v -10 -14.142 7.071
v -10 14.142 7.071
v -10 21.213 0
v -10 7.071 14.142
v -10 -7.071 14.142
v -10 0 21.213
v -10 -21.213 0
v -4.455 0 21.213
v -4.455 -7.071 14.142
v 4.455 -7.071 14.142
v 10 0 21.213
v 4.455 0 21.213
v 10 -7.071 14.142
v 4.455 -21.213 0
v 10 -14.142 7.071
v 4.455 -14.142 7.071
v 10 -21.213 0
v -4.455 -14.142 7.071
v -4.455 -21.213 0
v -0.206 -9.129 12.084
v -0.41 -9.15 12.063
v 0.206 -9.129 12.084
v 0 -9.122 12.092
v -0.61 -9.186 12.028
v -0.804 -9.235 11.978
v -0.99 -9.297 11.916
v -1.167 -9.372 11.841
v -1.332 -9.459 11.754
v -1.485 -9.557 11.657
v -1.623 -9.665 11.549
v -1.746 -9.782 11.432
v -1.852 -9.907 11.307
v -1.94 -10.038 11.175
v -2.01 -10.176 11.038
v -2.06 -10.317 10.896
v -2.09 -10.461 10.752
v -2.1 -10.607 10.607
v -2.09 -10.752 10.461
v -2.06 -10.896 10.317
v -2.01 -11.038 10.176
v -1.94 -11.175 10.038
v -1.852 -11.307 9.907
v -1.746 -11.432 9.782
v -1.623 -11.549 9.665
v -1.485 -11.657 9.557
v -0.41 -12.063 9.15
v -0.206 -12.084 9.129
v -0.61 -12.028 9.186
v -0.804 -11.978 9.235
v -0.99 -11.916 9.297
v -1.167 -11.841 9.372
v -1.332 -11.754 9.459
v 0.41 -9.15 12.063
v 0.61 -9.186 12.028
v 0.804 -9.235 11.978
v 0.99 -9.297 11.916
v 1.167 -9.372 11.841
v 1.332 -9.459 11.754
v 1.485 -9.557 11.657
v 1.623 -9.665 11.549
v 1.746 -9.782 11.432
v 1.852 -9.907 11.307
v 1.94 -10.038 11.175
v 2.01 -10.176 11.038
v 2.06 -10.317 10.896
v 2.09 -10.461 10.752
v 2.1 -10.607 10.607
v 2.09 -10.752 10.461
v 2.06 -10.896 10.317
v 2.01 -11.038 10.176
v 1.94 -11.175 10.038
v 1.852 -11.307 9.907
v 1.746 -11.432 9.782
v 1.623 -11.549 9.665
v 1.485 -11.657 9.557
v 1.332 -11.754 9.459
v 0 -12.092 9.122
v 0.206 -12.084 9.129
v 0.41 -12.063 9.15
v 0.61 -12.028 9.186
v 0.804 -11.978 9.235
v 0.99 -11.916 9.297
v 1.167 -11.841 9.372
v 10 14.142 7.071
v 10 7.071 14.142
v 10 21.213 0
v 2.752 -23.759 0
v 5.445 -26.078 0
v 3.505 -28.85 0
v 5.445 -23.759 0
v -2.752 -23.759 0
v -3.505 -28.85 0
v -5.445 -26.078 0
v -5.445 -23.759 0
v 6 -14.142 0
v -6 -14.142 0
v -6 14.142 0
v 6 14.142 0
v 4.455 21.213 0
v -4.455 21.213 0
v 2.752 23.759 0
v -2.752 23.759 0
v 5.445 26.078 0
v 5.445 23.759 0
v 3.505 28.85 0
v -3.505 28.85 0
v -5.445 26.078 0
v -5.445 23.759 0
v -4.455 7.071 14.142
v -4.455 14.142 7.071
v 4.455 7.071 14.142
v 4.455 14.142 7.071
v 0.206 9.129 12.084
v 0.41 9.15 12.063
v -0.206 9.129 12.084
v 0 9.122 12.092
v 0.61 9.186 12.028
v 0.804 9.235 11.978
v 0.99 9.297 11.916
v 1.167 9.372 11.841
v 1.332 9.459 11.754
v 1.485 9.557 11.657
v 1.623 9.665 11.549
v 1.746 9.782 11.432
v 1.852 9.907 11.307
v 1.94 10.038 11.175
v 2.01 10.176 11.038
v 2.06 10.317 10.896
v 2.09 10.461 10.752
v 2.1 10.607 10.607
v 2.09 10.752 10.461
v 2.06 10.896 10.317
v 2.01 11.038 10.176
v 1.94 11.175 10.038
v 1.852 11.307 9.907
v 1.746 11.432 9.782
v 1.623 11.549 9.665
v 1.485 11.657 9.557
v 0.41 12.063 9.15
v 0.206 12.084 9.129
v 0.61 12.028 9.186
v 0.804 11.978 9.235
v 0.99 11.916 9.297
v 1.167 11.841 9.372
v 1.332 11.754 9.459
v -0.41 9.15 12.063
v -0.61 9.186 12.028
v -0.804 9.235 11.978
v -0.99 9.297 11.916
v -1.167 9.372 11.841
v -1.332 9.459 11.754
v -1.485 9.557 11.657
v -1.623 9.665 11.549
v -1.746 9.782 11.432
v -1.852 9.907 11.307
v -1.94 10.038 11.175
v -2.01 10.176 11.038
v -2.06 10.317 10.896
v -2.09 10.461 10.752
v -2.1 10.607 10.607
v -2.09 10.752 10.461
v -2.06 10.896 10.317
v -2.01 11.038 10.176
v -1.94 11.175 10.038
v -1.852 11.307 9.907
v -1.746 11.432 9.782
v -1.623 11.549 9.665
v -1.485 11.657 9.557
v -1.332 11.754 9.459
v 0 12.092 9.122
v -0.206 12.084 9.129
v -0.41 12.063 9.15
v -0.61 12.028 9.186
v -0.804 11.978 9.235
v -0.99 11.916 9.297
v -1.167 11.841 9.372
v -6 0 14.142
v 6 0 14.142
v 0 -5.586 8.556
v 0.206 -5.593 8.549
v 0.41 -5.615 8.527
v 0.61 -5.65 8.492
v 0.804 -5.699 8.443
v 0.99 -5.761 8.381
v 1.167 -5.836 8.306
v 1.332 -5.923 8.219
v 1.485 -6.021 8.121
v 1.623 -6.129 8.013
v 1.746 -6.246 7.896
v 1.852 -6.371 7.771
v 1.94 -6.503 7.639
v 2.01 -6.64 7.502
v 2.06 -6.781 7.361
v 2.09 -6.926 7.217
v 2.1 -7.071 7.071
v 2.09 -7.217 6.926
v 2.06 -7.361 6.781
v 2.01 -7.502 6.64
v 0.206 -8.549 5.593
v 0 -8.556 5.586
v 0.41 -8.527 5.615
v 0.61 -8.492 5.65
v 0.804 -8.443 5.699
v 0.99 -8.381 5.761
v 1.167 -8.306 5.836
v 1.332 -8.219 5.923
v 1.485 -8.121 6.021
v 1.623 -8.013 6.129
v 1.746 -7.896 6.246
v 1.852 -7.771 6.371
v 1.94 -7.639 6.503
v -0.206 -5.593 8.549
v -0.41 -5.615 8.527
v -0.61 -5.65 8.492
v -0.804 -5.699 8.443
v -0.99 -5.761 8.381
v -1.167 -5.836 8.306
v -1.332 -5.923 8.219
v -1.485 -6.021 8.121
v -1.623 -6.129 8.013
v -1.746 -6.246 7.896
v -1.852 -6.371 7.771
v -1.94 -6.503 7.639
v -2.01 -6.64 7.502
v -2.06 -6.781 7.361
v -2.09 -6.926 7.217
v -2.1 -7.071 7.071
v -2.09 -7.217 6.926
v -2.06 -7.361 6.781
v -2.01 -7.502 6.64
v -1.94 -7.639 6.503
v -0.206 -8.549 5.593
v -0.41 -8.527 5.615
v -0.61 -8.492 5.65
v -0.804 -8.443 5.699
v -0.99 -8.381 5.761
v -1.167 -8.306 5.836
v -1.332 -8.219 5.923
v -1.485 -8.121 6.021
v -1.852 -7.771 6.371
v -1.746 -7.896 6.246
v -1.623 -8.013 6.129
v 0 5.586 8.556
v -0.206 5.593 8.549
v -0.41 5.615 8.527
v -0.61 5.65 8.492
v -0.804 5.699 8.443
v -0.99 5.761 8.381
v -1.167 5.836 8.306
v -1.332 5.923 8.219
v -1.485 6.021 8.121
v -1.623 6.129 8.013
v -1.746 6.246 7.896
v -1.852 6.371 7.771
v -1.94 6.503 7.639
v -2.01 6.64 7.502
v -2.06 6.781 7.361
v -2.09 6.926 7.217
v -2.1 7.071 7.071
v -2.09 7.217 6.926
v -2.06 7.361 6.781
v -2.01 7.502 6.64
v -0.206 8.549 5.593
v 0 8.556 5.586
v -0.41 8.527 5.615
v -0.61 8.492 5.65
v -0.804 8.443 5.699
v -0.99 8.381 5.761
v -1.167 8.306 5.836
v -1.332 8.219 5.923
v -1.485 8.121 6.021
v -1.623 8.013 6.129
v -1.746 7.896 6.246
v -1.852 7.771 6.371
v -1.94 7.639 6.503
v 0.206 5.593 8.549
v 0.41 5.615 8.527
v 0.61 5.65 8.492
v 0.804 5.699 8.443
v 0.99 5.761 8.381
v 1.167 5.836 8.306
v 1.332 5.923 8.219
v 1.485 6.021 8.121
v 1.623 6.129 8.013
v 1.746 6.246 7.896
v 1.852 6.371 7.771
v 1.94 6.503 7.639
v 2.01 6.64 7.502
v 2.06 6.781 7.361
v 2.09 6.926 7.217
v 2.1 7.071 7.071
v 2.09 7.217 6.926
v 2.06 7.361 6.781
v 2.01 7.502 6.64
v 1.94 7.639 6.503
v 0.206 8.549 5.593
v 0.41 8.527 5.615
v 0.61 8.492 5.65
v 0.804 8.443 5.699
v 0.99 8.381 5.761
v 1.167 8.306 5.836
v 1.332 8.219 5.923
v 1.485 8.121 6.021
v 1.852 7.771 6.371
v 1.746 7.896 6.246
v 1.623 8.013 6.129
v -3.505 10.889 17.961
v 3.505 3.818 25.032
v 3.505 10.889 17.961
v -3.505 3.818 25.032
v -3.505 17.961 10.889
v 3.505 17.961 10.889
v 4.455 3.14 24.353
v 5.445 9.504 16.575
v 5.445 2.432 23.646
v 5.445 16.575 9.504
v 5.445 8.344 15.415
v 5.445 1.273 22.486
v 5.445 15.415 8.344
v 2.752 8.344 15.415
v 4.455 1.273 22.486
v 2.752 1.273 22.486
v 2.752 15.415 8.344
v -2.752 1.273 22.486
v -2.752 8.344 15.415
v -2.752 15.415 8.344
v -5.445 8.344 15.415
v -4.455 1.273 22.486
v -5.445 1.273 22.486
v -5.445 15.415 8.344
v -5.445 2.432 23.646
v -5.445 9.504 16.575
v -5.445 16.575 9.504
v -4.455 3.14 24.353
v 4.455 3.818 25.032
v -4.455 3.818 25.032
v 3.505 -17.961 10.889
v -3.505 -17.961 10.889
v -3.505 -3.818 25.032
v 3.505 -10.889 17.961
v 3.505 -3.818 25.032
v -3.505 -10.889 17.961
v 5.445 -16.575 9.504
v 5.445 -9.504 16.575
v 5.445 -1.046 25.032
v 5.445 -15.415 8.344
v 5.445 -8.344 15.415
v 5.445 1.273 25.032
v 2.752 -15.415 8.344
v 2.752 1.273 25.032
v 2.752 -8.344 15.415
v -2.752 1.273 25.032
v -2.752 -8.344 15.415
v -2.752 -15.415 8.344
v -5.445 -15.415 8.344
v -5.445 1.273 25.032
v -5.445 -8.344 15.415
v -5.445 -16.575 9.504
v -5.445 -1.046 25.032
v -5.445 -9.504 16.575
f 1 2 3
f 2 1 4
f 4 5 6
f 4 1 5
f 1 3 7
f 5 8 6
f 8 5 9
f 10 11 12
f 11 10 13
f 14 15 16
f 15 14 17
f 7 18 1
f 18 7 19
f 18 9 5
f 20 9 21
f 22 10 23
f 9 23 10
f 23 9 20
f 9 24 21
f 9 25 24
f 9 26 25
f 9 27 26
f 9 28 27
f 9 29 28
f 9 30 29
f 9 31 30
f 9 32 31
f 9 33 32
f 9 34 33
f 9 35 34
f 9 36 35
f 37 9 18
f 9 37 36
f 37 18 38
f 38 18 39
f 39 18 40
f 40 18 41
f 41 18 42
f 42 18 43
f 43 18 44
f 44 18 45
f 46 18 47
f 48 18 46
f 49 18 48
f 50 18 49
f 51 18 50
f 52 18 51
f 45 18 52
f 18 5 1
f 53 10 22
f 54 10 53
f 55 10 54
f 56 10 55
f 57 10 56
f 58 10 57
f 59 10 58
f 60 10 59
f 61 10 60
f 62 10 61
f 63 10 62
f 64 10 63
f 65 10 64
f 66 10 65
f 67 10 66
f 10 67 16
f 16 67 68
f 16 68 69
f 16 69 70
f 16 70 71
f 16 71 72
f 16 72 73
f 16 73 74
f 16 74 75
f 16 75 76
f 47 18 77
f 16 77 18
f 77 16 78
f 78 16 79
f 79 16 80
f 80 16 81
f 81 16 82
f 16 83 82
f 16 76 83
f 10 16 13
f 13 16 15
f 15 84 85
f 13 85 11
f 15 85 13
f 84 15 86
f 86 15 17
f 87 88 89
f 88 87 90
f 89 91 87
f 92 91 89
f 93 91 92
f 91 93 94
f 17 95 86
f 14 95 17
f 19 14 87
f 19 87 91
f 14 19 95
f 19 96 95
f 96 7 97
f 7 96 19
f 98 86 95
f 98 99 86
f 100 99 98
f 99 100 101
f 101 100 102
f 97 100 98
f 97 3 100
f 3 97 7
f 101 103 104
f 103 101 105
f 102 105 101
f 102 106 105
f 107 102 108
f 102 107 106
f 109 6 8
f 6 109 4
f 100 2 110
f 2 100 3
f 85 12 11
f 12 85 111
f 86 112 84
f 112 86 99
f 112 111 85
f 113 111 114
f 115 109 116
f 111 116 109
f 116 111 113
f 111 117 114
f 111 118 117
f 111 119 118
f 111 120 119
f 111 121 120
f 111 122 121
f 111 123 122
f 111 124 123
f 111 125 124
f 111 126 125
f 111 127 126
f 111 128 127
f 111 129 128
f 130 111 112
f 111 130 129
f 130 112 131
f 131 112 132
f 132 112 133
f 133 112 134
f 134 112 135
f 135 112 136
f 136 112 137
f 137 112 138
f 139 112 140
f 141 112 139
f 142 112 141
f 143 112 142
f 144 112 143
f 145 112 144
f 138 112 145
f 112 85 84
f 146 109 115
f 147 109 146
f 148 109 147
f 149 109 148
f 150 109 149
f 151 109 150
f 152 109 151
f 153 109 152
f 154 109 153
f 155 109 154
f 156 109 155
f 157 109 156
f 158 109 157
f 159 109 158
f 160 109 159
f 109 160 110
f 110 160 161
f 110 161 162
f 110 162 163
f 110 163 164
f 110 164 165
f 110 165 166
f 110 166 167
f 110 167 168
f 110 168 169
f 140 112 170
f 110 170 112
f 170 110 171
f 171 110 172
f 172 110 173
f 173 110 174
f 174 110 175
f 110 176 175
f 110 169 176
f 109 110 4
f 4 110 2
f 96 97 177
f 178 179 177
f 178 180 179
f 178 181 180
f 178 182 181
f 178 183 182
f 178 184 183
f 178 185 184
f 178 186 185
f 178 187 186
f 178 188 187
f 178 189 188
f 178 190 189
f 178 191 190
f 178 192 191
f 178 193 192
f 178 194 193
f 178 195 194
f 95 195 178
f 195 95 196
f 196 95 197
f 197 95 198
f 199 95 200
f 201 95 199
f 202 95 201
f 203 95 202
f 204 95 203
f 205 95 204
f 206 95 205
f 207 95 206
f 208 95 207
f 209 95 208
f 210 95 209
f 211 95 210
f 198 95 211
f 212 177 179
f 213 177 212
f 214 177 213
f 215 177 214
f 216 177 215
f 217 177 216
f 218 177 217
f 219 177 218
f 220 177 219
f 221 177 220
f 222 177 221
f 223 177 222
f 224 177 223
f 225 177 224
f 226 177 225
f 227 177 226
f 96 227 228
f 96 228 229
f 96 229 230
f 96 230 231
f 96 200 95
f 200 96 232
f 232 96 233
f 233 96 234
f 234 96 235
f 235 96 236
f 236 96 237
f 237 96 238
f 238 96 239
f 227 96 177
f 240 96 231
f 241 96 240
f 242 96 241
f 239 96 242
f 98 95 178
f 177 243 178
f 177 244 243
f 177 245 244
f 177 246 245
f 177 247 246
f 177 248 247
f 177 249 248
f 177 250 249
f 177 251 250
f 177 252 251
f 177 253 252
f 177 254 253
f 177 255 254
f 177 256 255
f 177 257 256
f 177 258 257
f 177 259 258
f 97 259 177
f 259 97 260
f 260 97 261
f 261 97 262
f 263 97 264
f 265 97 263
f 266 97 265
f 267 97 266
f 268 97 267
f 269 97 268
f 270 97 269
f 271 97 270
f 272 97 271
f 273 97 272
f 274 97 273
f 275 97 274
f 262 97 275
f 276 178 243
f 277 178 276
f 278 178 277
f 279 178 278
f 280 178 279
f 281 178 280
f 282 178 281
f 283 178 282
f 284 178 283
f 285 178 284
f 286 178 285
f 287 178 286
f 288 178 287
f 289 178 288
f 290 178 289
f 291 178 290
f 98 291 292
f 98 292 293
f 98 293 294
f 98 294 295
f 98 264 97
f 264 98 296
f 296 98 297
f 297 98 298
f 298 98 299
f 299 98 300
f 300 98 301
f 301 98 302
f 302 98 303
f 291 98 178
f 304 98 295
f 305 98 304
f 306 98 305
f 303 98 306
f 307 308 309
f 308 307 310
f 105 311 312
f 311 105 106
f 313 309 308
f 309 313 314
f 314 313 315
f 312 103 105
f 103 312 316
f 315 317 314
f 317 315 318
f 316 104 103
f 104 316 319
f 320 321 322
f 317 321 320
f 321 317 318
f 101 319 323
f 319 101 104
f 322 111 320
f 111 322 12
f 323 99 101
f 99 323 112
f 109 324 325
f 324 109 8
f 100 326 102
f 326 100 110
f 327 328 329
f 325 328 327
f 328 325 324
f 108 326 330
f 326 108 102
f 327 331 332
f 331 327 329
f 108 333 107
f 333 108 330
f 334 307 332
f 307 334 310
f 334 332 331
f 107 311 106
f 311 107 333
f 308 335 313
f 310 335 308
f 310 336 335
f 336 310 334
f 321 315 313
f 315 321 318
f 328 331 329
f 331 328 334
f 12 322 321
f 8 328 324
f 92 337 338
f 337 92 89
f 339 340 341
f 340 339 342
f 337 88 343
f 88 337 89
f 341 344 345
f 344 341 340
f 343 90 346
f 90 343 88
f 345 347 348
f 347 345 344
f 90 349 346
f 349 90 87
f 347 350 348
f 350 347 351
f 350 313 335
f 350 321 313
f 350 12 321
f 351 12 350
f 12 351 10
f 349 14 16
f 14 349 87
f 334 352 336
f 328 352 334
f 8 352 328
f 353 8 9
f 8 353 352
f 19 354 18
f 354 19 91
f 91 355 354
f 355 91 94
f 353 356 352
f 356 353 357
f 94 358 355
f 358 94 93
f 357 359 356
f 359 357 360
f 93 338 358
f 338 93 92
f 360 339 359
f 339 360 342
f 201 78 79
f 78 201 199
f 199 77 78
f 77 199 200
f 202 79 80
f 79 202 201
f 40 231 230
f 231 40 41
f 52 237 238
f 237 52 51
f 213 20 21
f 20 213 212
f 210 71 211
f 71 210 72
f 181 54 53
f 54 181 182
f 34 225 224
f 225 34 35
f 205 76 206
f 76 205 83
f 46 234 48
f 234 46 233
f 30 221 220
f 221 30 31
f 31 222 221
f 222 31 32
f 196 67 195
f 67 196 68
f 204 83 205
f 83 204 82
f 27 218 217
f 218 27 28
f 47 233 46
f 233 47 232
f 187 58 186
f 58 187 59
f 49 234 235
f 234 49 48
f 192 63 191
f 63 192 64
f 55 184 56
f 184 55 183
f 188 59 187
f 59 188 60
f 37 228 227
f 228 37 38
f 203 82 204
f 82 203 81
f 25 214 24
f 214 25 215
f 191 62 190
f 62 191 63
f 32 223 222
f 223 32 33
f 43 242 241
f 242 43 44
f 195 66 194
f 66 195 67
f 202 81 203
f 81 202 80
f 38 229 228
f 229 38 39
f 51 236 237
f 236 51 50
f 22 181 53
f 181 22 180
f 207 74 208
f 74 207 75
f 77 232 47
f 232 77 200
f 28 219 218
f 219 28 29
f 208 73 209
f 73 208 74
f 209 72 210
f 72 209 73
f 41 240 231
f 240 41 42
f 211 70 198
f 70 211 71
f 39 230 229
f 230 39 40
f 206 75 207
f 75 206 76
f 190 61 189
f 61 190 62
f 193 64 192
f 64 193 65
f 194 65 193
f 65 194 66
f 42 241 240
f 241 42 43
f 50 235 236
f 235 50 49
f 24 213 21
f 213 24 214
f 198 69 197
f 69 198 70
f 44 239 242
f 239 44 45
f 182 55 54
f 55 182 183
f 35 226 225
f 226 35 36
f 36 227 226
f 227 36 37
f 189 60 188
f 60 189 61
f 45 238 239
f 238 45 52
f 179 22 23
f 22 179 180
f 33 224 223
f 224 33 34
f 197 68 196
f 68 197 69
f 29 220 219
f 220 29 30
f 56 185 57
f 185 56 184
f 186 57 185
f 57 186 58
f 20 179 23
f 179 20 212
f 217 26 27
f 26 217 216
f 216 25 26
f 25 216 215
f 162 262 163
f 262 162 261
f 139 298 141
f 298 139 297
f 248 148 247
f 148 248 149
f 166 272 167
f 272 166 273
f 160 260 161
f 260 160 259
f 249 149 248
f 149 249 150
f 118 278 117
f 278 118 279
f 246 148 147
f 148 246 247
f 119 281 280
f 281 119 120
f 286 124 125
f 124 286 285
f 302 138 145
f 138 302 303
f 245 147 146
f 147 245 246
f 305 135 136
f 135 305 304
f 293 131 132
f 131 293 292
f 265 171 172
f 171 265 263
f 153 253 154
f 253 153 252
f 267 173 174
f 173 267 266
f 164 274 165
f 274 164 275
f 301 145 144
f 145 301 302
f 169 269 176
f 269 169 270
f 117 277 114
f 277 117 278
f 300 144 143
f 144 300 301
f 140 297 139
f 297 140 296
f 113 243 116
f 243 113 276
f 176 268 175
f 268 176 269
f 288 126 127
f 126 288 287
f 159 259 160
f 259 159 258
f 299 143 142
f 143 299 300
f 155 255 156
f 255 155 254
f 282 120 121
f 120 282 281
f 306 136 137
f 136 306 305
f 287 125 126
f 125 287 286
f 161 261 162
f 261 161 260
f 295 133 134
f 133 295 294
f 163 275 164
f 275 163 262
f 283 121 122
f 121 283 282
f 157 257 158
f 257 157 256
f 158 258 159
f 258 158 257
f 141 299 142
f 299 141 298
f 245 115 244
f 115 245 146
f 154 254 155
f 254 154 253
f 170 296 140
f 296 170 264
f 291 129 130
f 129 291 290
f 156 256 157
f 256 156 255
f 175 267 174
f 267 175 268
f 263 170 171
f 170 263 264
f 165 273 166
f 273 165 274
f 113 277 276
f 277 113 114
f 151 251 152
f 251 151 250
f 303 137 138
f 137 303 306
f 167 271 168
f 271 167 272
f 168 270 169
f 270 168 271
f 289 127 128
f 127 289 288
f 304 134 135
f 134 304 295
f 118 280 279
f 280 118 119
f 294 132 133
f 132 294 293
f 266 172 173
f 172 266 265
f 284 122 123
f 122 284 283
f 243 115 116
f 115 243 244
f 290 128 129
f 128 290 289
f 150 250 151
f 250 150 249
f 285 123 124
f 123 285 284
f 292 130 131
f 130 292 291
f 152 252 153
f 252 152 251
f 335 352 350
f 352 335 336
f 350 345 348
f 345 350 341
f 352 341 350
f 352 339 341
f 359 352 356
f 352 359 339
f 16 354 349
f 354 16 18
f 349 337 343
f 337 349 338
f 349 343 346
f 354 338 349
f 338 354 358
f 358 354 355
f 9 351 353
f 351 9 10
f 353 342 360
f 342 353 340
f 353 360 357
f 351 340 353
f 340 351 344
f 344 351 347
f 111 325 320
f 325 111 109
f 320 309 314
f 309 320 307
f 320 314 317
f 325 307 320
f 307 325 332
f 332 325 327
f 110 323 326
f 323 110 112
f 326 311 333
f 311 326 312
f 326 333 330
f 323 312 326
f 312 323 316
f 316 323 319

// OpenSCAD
// Extruded profile witdh
Size = 20;
// Corner's angle
Angle = 90; // [5:175]
// Length of one side
Length1 = 30;
// Length of the other side
Length2 = 30;
// Number of screw holes in one side
Screws1 = 1;
// Number of screw holes in the other side
Screws2 = 1;
// Thickness of the sides
ThicknessSide = 5;
// Thickness of the laterals
ThicknessLateral = 4;
// Space between guide chunk's
NutSize = 10;
// Diameter of the screw holes
Metric = 4.2;
// Number of profile sections
Sections = 1;
// Distance between rail and piece
RailOffset = 0; // [0:0.01:1]
// Extra distance between piece and rail's head
RailHeightReduction = 0; // [-0.5:0.01:1.5]
// Extra height of rail connector
RailConnectorExtra = 0; // [-1:0.01:1]
// Height removed from profile rail
RailCut = 0.91;
// Width shrink of profile rail
RailShrink = 0.99;

$fn = 64;

module vSlot(
    railOffset=0,
    railHeightReduction=0,
    railConnectorExtra=0,
    railCut=0,
    railShrink=1,
) {
    basePoints = [
        //[-2.00,  4.50],
        [0.00+railOffset,  4.50],
        [1.80+railOffset+railConnectorExtra,  2.78],
        [1.80+railOffset+railConnectorExtra,  5.50],
        [3.44+railOffset+railConnectorExtra-railHeightReduction,  5.50],
        [6.10+railOffset+railConnectorExtra-railHeightReduction,  2.84],
        [6.10+railOffset+railConnectorExtra-railHeightReduction,  0.21],
        [6.31+railOffset+railConnectorExtra-railHeightReduction,  0.00],
        [6.10+railOffset+railConnectorExtra-railHeightReduction, -0.21],
        [6.10+railOffset+railConnectorExtra-railHeightReduction, -2.84],
        [3.44+railOffset+railConnectorExtra-railHeightReduction, -5.50],
        [1.80+railOffset+railConnectorExtra, -5.50],
        [1.80+railOffset+railConnectorExtra, -2.78],
        [0.00+railOffset, -4.50],
        //[-2.00, -4.50],
    ];
    points = railOffset == 0 ? basePoints : concat([[0.00, 4.50]], basePoints, [[0.00, -4.50]]);

    scale([1, railShrink])
        difference() {
            polygon(points);

            translate([((3/2)*(6.31+railOffset+railConnectorExtra-railHeightReduction))-railCut, 0])
                square([6.31+railOffset+railConnectorExtra-railHeightReduction, 11], true);
        }
}

module triangle(angle=90, length1=30, length2=30)
{
    polygon([
        [0, 0],
        [length1, 0],
        [cos(angle)*length2, sin(angle)*length2],
    ]);
}

module body(
    angle=90,
    length1=30,
    length2=30,
    thicknessSide=5,
    thicknessLateral=4,
    size=20,
    sections=1,
) {
    if (sections > 1)
    {
        translate([0, 0, -0.5*(sections-1)*size])
            for(s = [0:max(0,sections-1)])
            {
                translate([0, 0, s*size])
                    body(
                        angle=angle,
                        length1=length1,
                        length2=length2,
                        thicknessSide=thicknessSide,
                        thicknessLateral=thicknessLateral,
                        size=size,
                        sections=1
                    );
            }
    } else {
        translate([0, 0, -size/2])
            difference()
            {
                linear_extrude(height=size)
                    triangle(angle=angle, length1=length1, length2=length2);

                translate([(1/tan(angle/2))*thicknessSide, thicknessSide, thicknessLateral])
                    linear_extrude(height=size-(2*thicknessLateral))
                        triangle(angle=angle, length1=length1, length2=length2);
            }
    }
}

module railAngled(
    angle=90,
    length=30,
    size=20,
    railOffset=0,
    railHeightReduction=0,
    railConnectorExtra=0,
    railCut=0,
    railShrink=1,
) {
    difference()
    {
        rotate([90, 0, 90+angle])
            translate([0, 0, -length])
                linear_extrude(height=3*length)
                    vSlot(
                        railOffset=railOffset,
                        railHeightReduction=railHeightReduction,
                        railConnectorExtra=railConnectorExtra,
                        railCut=railCut,
                        railShrink=railShrink
                    );

        translate([0, -length, 0])
            cube([length*3, length*2, size], true);
    }
}

module railStraight(
    length=30,
    size=20,
    railOffset=0,
    railHeightReduction=0,
    railConnectorExtra=0,
    railCut=0,
    railShrink=1,
) {
    rotate([90, 0, 270])
        translate([0, 0, -2*length])
            linear_extrude(height=3*length)
                vSlot(
                    railOffset=railOffset,
                    railHeightReduction=railHeightReduction,
                    railConnectorExtra=railConnectorExtra,
                    railCut=railCut,
                    railShrink=railShrink
                );
}

module bodyWithRails(
    size=20,
    angle=90,
    length1=30,
    length2=30,
    thicknessSide=5,
    thicknessLateral=4,
    sections=1,
    railOffset=0,
    railHeightReduction=0,
    railConnectorExtra=0,
    railCut=0,
    railShrink=1,
) {
    union()
    {
        body(
            angle=angle,
            length1=length1,
            length2=length2,
            thicknessSide=thicknessSide,
            thicknessLateral=thicknessLateral,
            size=size,
            sections=sections
        );

        translate([0, 0, -0.5*(sections-1)*size])
            for(s = [0:max(0,sections-1)])
            {
                translate([0, 0, s*size])
                {
                    railAngled(
                        angle=angle,
                        length=length2,
                        size=size,
                        railOffset=railOffset,
                        railHeightReduction=railHeightReduction,
                        railConnectorExtra=railConnectorExtra,
                        railCut = railCut,
                        railShrink = railShrink
                    );

                    railStraight(
                        length=length1,
                        size=size,
                        railOffset=railOffset,
                        railHeightReduction=railHeightReduction,
                        railConnectorExtra=railConnectorExtra,
                        railCut = railCut,
                        railShrink = railShrink
                    );
                }
            }
    }
}

module printPosition(angle, alpha, hypotenuse) {
    translate([0, 0, (1/tan(angle/2))*(hypotenuse/2)])
        rotate([-alpha, 0, 0])
            rotate([0, 90, 0])
                children();
}

module VSlotConnector(
    size=20,
    angle=90,
    length1=30,
    length2=30,
    thicknessSide=5,
    thicknessLateral=4,
    screws1=1,
    screws2=1,
    nutSize=15,
    metric=4,
    sections=1,
    railOffset=0,
    railHeightReduction=0,
    railConnectorExtra=0,
    railCut=0,
    railShrink=1,
) {
    hypotenuse = sqrt((length1*length1)+(length2*length2)-(2*length1*length2*cos(angle)));
    alpha = 90-acos(((length1*length1)+(hypotenuse*hypotenuse)-(length2*length2))/(2*length1*hypotenuse));
    maxLength = length1*length2;
    fullSize = size*sections;

    printPosition(angle=angle, alpha=alpha, hypotenuse=hypotenuse)
        difference()
        {
            bodyWithRails(
                angle=angle,
                length1=length1,
                length2=length2,
                thicknessSide=thicknessSide,
                thicknessLateral=thicknessLateral,
                size=size,
                sections=sections,
                railOffset=railOffset,
                railHeightReduction=railHeightReduction,
                railConnectorExtra=railConnectorExtra,
                railCut = railCut,
                railShrink = railShrink
            );

            // Cut base
            translate([length1, 0, 0])
                rotate([0, 0, alpha])
                    translate([maxLength/2, 0, 0])
                        cube([maxLength, maxLength, fullSize], true);

            // Cut top
            translate([-((6.31-railCut)*cos(90-angle)), 0, 0])
                rotate([0, 0, angle/2])
                    translate([(-maxLength/2), 0, 0])
                        cube([maxLength, maxLength, fullSize], true);

            // Nut Straight
            for (i = [1:screws1])
                translate([(i*length1)/(screws1+1), -4, 0])
                    cube([nutSize, 8, fullSize], true);
            
            // Nut Angled
            for (i = [1:screws2])
                rotate([0, 0, angle])
                    translate([(i*length2)/(screws2+1), 4, 0])
                        cube([nutSize, 8, fullSize], true);

            // Screws
            translate([0, 0, -0.5*(sections-1)*size])
                for(s = [0:max(0,sections-1)])
                {
                    translate([0, 0, s*size])
                    {
                        // Screw Straight
                        for (i = [1:screws1])
                            rotate([90, 0, 0])
                                translate([(i*length1)/(screws1+1), 0, -(0.1+thicknessSide)])
                                    cylinder(h=thicknessSide+0.2, d=metric);
                        
                        // Screw Angled
                        for (i = [1:screws2])
                            rotate([0, 90, angle-90])
                                translate([0, (i*length2)/(screws2+1), -0.1])
                                    cylinder(h=thicknessSide+0.2, d=metric);
                    }
                }
        }
}

VSlotConnector(
    size = Size,
    angle = Angle,
    length1 = Length1,
    length2 = Length2,
    thicknessSide = ThicknessSide,
    thicknessLateral = ThicknessLateral,
    screws1 = Screws1,
    screws2 = Screws2,
    nutSize = NutSize,
    metric = Metric,
    sections = Sections,
    railOffset = RailOffset,
    railHeightReduction = RailHeightReduction,
    railConnectorExtra = RailConnectorExtra,
    railCut = RailCut,
    railShrink = RailShrink
);
